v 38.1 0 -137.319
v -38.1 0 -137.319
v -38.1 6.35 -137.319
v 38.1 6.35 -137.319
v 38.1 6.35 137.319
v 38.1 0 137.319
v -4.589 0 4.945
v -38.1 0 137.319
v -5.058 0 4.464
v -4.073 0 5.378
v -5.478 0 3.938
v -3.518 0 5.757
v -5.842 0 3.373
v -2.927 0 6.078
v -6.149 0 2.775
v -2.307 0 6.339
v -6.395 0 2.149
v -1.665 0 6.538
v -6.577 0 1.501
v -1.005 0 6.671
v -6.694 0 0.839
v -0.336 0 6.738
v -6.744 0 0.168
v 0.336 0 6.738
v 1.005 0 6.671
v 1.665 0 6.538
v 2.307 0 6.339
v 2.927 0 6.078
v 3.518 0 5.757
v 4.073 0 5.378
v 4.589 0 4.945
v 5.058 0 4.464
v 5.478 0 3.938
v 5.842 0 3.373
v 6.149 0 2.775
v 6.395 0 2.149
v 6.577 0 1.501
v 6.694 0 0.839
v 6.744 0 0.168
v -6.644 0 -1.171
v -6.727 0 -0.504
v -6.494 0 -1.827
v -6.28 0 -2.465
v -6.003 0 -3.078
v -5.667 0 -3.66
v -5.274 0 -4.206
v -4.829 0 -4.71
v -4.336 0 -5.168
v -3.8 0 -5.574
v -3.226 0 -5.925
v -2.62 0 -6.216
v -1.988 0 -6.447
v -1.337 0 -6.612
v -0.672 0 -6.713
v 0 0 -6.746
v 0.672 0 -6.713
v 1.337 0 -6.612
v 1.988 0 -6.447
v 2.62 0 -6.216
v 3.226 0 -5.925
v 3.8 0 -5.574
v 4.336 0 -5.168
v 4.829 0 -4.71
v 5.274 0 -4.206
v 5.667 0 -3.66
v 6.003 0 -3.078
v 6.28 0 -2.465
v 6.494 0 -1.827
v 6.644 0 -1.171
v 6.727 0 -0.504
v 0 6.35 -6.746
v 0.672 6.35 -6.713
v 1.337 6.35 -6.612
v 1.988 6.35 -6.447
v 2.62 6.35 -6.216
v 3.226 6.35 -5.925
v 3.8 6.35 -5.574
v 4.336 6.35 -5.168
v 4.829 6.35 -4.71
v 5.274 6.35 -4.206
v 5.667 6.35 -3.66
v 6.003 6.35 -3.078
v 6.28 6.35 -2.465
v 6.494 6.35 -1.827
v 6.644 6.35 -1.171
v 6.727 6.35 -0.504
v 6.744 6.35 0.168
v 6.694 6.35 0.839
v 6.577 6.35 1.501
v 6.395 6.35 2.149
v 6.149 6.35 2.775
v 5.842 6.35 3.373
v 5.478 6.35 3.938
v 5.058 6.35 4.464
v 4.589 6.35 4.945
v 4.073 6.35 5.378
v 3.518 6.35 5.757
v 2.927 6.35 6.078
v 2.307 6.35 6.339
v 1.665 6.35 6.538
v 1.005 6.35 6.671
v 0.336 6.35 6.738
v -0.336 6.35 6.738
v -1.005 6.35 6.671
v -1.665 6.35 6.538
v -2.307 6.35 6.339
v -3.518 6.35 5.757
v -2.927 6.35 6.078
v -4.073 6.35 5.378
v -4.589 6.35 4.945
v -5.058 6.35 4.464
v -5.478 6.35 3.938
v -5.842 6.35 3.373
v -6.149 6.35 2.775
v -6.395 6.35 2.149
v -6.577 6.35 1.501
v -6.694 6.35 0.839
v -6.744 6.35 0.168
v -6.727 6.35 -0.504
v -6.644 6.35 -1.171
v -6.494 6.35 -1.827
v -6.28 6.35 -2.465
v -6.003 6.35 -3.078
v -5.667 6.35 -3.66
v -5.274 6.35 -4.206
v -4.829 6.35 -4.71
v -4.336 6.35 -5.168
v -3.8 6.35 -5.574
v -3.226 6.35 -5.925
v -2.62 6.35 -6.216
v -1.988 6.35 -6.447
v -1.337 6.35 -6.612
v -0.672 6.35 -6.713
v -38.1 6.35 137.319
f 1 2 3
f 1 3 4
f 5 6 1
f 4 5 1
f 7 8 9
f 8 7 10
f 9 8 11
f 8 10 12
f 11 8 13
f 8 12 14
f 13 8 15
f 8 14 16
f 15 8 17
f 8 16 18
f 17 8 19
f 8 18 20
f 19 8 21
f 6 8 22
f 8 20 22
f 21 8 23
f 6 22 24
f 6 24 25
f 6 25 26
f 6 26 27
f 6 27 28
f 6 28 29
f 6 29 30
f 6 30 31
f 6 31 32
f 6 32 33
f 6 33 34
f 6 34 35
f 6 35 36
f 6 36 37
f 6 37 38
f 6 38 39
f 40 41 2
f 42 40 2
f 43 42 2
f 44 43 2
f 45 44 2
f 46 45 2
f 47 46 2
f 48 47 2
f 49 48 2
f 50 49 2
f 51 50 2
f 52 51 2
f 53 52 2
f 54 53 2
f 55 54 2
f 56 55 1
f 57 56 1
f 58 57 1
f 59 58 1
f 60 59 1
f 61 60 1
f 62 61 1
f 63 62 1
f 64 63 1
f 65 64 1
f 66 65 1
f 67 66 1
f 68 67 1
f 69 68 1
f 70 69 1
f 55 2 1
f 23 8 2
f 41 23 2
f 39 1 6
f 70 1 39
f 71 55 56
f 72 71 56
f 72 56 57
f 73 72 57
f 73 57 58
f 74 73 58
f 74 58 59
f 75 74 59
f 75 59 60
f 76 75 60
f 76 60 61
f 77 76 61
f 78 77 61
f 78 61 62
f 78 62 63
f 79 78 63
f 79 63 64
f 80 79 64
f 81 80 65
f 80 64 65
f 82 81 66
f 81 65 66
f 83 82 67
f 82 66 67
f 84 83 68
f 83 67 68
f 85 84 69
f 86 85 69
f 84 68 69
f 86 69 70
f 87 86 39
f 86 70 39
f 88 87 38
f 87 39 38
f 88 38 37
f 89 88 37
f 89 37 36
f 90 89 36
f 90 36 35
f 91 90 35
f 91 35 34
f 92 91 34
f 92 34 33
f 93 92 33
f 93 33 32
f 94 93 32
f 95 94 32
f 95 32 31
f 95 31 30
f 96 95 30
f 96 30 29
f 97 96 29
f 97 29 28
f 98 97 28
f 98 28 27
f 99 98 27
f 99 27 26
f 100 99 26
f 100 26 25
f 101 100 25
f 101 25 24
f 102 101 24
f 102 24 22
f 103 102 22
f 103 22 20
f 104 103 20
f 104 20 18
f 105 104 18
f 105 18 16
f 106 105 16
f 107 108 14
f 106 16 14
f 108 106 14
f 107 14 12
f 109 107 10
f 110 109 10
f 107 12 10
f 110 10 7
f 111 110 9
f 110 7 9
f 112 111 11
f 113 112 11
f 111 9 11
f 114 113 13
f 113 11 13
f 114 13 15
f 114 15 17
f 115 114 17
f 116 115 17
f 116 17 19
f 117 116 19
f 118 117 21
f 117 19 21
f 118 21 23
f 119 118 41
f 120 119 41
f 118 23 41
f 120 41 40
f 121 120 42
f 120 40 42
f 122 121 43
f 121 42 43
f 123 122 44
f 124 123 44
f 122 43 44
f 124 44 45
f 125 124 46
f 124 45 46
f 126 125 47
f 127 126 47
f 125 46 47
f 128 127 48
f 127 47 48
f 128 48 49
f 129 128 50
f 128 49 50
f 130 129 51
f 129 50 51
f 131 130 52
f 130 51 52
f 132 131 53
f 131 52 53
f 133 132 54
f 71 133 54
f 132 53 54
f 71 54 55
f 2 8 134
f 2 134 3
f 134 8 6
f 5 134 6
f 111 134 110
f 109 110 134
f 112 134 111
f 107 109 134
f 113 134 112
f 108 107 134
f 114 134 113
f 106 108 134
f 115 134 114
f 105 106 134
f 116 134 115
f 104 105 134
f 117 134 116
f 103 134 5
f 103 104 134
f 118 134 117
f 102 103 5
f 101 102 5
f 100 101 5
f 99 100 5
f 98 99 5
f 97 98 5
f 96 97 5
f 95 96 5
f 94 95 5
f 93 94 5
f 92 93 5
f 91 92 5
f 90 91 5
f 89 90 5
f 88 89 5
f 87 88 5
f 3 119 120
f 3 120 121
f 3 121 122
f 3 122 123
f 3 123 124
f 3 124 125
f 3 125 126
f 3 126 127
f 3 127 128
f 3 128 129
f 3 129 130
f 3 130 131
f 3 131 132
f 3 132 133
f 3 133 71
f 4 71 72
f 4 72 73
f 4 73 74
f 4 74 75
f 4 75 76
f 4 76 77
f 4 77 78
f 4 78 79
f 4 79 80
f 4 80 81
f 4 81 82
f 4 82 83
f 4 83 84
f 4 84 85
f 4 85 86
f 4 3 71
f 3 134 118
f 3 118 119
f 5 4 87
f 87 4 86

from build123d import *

# Parameters (mm, degrees)
SKETCH1_W           = 76.2
SKETCH1_H           = 274.6375
BOSS_EXTRUDE1_DEPTH = 6.35
SKETCH2_R           = 6.74624
CUT_EXTRUDE1_DEPTH  = 143.647718529


with BuildPart() as part:
    # Sketch1 → Boss-Extrude1 (new body)
    with BuildSketch(Plane(origin=(0, 0, 0), x_dir=(1, 0, 0), z_dir=(0, 1, 0))):
        Rectangle(SKETCH1_W, SKETCH1_H)
    extrude(amount=BOSS_EXTRUDE1_DEPTH)

    # Sketch2 → Cut-Extrude1 (cut, through all)
    with BuildSketch(Plane.XZ):
        with Locations(Location((0, 0, 0), (0, 0, 270))):
            Circle(SKETCH2_R)
    extrude(amount=-CUT_EXTRUDE1_DEPTH, mode=Mode.SUBTRACT)


solid = part.part
